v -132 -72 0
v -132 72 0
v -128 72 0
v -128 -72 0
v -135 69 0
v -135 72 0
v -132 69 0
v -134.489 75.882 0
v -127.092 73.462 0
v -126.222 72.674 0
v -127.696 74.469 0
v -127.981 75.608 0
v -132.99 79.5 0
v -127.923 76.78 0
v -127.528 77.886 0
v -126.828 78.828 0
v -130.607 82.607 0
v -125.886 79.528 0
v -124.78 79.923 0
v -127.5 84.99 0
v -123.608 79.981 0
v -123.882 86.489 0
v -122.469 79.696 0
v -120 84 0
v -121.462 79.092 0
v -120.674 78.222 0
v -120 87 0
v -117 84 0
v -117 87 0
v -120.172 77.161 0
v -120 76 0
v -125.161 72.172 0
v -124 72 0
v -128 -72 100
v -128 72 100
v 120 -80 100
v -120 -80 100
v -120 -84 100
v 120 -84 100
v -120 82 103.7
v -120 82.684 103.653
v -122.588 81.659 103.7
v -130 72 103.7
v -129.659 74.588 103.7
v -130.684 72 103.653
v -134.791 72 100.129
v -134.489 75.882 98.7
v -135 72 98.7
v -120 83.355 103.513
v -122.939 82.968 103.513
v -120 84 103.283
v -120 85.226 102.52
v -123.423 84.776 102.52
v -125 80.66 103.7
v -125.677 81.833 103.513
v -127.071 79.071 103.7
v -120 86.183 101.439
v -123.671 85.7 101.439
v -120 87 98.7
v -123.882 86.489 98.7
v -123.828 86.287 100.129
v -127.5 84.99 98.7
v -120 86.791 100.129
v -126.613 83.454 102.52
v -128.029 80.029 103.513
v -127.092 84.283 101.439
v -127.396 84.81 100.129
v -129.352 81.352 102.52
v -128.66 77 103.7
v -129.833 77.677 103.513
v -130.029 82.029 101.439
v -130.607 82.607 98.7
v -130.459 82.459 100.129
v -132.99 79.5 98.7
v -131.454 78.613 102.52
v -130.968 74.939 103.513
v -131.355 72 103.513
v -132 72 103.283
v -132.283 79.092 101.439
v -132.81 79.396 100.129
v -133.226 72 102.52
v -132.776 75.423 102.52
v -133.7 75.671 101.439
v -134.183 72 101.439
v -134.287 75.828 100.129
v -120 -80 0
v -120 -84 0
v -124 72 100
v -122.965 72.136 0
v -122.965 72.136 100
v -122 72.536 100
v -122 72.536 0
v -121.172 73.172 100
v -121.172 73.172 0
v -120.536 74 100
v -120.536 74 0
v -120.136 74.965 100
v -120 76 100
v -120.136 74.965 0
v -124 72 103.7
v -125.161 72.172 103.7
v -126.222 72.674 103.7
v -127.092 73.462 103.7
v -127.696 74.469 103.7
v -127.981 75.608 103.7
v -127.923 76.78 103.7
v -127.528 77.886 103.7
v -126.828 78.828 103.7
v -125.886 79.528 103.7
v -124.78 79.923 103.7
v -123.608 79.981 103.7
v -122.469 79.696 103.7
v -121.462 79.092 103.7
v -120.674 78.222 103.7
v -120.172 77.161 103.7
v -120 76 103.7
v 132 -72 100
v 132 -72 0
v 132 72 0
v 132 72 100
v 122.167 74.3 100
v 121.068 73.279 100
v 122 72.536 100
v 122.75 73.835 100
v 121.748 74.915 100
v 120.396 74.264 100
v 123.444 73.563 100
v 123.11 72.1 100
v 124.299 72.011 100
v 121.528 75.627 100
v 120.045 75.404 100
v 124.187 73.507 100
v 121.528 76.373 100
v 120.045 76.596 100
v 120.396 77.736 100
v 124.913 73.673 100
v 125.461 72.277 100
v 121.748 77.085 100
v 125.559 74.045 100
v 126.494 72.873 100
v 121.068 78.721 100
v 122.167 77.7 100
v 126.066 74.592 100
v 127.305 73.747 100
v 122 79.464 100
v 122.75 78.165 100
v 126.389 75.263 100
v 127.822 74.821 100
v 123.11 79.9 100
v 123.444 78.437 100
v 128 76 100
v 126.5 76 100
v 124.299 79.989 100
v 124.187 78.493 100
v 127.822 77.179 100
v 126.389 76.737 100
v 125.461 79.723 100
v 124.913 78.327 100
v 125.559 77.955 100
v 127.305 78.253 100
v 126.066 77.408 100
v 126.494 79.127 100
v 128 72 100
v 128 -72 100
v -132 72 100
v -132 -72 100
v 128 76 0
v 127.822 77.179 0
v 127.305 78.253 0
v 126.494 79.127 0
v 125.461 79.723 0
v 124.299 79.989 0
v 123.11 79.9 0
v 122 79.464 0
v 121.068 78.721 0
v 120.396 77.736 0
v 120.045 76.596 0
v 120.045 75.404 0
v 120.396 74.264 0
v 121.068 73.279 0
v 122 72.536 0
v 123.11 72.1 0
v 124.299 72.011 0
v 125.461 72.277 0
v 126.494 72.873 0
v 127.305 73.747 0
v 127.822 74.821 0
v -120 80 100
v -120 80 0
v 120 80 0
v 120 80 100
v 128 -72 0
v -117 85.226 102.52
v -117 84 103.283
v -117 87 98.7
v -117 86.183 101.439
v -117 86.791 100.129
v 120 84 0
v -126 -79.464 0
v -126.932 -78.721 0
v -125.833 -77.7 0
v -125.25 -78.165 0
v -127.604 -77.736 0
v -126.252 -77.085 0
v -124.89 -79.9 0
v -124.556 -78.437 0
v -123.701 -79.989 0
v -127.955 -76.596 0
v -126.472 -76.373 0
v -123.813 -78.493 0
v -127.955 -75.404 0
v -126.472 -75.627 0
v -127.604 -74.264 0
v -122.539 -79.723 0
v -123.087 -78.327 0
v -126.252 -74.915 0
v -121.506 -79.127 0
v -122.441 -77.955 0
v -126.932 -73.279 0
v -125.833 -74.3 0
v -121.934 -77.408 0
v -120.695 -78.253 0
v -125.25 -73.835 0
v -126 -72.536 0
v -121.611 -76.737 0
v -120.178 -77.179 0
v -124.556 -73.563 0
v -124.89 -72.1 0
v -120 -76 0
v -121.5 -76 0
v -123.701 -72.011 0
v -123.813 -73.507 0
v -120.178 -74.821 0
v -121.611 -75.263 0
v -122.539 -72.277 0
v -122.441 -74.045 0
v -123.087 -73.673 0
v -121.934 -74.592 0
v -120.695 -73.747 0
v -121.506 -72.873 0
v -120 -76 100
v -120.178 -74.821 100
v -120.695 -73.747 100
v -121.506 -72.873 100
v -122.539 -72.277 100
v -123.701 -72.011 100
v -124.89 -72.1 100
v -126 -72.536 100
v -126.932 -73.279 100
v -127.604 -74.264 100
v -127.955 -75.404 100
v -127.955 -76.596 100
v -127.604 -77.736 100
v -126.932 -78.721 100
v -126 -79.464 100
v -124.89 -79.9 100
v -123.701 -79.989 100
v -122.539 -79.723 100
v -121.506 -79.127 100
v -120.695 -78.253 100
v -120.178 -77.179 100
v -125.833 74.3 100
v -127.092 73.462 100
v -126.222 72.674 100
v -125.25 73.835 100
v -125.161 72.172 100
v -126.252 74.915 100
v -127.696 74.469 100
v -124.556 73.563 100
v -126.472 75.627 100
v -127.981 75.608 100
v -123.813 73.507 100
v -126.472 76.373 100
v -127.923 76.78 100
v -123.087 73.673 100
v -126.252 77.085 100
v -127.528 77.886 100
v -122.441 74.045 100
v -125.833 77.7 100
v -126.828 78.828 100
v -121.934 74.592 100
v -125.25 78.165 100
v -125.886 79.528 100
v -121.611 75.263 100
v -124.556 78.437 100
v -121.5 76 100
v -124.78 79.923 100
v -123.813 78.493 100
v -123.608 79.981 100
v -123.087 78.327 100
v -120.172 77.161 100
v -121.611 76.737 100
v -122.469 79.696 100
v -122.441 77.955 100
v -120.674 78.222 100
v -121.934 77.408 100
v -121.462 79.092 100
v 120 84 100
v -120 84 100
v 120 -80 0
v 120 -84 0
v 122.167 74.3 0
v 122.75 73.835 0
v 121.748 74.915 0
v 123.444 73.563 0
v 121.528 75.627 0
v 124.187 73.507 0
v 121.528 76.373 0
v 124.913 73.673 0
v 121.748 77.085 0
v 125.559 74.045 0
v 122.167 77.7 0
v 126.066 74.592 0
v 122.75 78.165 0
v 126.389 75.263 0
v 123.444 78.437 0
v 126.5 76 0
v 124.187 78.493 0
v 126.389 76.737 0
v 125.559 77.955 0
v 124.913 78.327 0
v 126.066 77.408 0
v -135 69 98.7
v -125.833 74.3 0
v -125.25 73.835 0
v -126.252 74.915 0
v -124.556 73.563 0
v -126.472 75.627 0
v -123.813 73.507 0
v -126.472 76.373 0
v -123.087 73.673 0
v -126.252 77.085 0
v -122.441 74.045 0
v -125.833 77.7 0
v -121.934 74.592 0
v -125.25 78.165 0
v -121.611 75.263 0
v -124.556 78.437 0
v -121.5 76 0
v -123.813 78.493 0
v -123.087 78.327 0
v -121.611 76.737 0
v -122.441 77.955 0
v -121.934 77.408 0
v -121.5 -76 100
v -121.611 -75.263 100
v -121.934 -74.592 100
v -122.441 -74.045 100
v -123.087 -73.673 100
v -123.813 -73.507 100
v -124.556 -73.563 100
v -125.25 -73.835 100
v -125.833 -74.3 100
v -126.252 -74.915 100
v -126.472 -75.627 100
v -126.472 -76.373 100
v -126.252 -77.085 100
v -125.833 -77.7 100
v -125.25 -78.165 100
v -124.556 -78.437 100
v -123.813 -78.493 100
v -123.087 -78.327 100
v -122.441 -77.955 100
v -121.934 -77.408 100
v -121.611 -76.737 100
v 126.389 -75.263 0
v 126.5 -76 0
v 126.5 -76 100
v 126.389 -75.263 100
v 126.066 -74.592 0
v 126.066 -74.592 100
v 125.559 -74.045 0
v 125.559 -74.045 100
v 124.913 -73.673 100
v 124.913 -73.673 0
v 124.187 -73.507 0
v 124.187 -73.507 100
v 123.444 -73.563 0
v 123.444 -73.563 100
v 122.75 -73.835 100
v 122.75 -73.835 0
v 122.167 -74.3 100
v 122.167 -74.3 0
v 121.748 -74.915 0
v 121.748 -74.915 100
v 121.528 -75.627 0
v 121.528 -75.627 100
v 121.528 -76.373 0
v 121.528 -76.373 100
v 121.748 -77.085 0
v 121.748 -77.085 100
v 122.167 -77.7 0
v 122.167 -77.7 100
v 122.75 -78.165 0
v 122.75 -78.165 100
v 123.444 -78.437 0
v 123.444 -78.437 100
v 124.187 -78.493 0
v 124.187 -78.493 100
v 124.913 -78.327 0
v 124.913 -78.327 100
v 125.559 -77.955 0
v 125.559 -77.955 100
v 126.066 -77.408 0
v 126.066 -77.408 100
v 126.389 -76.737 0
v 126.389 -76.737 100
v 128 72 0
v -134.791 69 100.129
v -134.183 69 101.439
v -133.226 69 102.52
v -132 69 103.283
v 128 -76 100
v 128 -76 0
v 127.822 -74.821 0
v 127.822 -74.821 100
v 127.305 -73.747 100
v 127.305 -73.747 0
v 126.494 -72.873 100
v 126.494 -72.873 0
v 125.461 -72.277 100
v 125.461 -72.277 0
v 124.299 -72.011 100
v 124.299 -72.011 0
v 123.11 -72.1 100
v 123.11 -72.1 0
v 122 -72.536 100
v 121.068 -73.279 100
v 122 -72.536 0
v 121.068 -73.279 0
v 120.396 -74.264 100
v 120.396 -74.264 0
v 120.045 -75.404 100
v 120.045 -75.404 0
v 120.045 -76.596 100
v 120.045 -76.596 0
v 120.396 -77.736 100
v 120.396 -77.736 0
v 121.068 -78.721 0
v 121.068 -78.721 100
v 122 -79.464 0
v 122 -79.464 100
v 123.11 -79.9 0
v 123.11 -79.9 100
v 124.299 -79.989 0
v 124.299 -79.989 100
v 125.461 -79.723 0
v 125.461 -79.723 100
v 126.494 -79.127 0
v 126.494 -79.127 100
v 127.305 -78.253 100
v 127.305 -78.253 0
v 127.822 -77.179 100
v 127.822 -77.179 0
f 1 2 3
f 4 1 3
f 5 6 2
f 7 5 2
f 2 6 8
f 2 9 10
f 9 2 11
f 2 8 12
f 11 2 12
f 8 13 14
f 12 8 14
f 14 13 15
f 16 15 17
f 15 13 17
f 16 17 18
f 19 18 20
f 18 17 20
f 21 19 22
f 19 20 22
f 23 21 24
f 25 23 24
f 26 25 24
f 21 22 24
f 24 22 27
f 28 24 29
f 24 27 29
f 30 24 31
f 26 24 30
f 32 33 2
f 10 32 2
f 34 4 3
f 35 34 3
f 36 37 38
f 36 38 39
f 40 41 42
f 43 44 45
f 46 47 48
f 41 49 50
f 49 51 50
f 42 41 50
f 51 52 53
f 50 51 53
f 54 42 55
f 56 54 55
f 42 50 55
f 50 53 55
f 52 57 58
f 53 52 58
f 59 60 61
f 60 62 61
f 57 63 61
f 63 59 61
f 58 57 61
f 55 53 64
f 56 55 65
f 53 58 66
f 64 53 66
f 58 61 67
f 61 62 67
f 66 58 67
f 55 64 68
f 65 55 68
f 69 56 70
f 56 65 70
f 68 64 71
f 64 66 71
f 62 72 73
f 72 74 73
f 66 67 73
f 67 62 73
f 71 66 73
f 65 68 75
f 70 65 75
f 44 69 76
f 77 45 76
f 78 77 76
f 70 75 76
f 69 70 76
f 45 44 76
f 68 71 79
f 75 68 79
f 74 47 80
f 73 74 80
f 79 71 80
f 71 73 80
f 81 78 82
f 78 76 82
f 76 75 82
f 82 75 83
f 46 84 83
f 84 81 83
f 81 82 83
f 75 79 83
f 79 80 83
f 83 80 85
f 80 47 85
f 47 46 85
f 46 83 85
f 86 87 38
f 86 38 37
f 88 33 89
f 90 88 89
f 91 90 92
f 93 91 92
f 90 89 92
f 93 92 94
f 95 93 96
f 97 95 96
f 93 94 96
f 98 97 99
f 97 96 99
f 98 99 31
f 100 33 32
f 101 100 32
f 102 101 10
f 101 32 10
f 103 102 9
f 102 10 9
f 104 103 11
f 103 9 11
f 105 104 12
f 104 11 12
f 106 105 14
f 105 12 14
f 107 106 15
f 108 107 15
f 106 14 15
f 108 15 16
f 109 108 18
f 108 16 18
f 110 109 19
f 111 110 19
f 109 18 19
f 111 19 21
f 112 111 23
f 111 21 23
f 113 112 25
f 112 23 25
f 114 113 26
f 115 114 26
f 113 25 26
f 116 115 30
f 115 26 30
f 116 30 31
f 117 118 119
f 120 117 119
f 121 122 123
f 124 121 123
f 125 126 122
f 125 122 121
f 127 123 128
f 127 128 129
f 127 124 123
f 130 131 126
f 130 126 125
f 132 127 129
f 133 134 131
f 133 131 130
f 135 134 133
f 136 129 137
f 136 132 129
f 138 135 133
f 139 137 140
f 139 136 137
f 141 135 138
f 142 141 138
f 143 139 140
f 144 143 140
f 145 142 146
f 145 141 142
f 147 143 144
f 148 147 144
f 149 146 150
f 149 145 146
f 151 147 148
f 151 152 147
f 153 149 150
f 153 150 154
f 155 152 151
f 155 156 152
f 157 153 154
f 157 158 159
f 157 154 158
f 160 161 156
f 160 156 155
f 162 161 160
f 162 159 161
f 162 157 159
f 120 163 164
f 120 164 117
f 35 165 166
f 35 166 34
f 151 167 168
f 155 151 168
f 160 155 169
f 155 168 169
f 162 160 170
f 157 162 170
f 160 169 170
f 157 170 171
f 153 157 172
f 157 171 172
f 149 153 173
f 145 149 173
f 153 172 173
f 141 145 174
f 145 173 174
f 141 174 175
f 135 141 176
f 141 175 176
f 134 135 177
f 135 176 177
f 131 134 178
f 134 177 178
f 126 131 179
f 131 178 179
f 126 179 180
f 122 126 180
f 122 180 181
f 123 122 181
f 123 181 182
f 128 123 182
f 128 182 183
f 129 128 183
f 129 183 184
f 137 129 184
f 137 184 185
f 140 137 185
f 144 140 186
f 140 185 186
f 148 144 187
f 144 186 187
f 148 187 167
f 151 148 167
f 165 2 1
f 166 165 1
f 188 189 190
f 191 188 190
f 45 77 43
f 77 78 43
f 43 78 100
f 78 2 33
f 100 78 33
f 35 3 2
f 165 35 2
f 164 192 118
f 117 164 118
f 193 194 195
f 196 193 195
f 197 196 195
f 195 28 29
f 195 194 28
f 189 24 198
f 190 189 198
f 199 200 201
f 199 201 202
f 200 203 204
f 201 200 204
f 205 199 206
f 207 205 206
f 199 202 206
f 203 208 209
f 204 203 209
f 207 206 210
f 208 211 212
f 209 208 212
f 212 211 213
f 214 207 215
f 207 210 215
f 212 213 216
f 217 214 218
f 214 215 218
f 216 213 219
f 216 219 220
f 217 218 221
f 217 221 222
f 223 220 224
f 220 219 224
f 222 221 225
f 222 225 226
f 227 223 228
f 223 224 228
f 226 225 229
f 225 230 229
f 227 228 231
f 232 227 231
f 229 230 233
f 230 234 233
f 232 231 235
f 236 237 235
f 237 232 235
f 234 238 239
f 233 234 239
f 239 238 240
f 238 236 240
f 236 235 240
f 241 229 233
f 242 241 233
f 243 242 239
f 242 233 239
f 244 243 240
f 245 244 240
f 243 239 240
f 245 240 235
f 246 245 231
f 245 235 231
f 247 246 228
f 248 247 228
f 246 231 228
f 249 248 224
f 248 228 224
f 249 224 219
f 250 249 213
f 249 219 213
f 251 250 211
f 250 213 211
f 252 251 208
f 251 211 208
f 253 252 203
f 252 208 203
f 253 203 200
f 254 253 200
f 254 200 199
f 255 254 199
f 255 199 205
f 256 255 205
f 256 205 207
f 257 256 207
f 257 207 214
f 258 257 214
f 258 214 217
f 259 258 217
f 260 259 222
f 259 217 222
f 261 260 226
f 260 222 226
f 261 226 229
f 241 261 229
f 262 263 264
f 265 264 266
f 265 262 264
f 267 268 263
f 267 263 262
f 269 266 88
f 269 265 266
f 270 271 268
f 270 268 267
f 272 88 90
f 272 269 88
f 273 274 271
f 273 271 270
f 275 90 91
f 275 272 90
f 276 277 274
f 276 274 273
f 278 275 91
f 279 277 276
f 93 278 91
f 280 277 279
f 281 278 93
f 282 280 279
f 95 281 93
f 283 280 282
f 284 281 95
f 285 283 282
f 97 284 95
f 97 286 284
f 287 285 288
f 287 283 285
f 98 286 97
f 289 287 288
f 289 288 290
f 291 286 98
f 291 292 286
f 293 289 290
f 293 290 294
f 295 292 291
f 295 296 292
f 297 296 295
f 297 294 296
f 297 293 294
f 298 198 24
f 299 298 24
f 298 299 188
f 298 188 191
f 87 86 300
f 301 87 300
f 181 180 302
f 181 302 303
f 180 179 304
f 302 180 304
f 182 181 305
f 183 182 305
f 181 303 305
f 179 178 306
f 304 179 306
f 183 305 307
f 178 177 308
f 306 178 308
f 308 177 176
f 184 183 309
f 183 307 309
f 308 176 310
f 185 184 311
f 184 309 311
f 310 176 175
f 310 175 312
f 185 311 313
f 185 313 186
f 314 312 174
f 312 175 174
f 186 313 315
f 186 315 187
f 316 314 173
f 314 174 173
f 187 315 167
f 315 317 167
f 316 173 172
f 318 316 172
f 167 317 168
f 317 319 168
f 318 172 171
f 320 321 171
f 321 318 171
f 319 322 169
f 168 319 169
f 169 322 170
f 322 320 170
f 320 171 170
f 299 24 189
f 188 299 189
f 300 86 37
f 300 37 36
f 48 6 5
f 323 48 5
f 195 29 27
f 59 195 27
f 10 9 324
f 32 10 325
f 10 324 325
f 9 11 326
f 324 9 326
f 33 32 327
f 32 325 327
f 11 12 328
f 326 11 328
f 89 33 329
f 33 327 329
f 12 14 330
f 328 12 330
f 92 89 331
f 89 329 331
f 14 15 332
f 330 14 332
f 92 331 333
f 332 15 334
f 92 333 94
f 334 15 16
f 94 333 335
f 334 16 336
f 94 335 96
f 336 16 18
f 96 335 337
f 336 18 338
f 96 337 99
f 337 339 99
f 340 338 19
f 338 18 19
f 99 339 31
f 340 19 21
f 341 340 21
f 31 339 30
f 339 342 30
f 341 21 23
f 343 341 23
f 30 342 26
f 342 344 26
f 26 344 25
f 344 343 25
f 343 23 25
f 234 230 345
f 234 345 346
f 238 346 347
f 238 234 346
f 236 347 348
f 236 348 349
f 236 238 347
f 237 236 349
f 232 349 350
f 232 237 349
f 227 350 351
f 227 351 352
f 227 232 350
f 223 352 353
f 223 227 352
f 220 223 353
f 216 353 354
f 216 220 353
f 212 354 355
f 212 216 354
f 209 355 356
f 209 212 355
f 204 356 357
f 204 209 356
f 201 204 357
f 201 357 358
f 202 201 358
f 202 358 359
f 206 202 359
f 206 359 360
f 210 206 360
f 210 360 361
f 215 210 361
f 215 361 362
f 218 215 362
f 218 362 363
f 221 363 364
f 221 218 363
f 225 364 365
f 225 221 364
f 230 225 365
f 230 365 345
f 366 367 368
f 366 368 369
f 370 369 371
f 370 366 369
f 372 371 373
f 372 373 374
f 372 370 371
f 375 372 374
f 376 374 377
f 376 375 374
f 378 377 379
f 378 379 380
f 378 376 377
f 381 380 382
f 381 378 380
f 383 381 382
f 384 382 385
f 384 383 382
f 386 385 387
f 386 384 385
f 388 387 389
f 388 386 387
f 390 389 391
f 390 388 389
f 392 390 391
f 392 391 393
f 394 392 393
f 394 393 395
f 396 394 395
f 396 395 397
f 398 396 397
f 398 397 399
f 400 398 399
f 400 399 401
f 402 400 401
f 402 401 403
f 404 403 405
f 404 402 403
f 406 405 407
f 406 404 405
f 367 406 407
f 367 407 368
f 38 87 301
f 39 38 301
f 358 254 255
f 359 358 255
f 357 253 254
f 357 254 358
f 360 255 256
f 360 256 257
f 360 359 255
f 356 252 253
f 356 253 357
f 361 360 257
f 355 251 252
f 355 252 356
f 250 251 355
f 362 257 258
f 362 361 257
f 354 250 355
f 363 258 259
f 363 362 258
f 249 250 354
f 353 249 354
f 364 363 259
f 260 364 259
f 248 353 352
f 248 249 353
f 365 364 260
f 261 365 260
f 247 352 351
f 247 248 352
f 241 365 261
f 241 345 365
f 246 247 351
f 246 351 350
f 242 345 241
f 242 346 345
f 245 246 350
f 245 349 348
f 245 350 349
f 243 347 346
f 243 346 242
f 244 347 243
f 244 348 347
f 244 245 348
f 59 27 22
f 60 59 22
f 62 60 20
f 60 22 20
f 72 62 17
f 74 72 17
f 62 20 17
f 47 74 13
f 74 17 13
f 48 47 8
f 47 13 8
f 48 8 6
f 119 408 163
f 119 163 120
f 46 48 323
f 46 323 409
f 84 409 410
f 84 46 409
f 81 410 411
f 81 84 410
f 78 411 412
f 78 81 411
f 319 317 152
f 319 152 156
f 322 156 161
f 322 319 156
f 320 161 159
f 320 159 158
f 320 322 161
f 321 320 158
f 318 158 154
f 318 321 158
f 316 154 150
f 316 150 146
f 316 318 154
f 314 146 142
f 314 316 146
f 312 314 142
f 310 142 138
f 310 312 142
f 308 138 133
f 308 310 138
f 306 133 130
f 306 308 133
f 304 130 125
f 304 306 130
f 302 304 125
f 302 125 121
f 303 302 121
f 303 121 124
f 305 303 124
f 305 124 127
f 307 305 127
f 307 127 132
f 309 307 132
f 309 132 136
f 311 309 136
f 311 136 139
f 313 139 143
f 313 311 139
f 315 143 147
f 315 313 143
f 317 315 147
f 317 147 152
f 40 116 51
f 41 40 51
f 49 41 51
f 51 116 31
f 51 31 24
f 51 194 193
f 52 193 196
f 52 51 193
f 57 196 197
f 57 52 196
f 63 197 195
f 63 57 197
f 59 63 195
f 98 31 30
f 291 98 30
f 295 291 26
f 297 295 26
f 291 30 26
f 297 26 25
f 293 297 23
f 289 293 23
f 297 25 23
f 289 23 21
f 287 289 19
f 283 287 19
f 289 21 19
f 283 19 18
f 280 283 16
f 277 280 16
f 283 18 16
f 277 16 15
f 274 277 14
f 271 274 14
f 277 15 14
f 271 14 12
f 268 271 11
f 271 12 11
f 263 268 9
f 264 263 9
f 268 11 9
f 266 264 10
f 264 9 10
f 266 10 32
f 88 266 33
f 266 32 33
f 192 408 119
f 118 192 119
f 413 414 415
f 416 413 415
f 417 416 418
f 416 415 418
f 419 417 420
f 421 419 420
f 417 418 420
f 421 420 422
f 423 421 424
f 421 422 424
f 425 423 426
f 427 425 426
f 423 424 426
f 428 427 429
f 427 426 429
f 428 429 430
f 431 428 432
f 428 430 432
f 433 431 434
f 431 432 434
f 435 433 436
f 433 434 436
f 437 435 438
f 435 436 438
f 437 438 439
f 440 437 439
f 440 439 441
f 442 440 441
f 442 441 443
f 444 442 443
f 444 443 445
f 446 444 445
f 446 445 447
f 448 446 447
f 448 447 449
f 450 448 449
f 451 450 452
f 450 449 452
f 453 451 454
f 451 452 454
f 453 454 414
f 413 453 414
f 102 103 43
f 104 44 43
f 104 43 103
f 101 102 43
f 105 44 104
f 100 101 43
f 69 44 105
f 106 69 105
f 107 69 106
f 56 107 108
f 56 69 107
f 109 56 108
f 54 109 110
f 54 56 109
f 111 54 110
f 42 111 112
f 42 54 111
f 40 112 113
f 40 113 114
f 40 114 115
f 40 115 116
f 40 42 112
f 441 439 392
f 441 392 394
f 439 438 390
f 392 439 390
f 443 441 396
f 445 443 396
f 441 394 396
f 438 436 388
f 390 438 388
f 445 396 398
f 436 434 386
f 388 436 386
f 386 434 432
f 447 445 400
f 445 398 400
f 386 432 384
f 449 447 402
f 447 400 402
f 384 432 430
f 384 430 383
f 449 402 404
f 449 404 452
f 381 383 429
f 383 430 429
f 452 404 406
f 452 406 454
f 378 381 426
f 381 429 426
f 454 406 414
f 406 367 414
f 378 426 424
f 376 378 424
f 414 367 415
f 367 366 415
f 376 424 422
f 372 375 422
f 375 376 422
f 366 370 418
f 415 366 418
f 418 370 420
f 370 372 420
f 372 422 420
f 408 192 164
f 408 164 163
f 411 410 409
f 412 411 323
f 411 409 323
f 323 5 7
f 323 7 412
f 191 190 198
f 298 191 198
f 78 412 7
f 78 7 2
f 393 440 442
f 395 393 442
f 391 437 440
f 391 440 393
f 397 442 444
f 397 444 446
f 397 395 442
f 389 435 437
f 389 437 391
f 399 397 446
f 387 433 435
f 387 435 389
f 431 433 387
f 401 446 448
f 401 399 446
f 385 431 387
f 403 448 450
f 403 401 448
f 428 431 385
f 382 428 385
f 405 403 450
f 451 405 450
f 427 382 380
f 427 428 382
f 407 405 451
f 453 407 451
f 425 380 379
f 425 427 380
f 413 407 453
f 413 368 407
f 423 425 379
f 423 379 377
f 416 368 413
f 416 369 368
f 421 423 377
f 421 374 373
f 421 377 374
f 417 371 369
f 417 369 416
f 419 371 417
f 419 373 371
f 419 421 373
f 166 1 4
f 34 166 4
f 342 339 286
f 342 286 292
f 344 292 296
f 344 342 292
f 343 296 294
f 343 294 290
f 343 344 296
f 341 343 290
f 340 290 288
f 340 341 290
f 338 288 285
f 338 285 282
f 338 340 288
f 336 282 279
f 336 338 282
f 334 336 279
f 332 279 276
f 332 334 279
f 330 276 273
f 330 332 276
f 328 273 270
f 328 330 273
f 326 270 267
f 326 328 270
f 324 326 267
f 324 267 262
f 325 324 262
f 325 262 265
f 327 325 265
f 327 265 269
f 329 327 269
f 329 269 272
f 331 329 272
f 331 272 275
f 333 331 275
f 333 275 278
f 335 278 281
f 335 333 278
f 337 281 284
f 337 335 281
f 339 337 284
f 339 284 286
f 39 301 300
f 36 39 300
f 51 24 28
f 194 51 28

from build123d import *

# Parameters (mm, degrees)
F0_R        = 2.5
F1_DEPTH    = 100
F0_R_2      = 4
F0_W        = 240
F0_H        = 4
F0_W_2      = 4
F0_H_2      = 144
F2_DEPTH    = 103.7
F3_T1_DEPTH = 15.5
F3_T3_DEPTH = 15.5
F3_T6_ANGLE = 90


# Not quite as in the source:
# - a fillet or chamfer that OpenCascade refuses, or shapes differently, is made with other operations: its cross-section is extruded or revolved along the edge and cut away or added


with BuildPart() as f1:
    # F0 (on Top) → F1 (new body)
    with BuildSketch(Plane.XY):
        with BuildLine():
            ThreePointArc((-124, 72), (-121.1715728753, 73.1715728753), (-120, 76))
            ThreePointArc((-120, 76), (-126.8284271247, 78.8284271247), (-124, 72))
        make_face()
        with Locations((-124, 76)):
            Circle(F0_R, mode=Mode.SUBTRACT)
    extrude(amount=F1_DEPTH)


with BuildPart() as f1b:
    # F0 (on Top) → F1, piece 2 (new body)
    with BuildSketch(Plane.XY):
        with Locations((-124, -76)):
            Circle(F0_R_2)
        with Locations((-124, -76)):
            Circle(F0_R, mode=Mode.SUBTRACT)
    extrude(amount=F1_DEPTH)


with BuildPart() as f1c:
    # F0 (on Top) → F1, piece 3 (new body)
    with BuildSketch(Plane.XY):
        with Locations((124, -76)):
            Circle(F0_R_2)
        with Locations((124, -76)):
            Circle(F0_R, mode=Mode.SUBTRACT)
    extrude(amount=F1_DEPTH)


with BuildPart() as f1d:
    # F0 (on Top) → F1, piece 4 (new body)
    with BuildSketch(Plane.XY):
        with Locations((124, 76)):
            Circle(F0_R_2)
        with Locations((124, 76)):
            Circle(F0_R, mode=Mode.SUBTRACT)
    extrude(amount=F1_DEPTH)


with BuildPart() as f1e:
    # F0 (on Top) → F1, piece 5 (new body)
    with BuildSketch(Plane.XY):
        Polygon((-120, 84), (-120, 80), (120, 80), (120, 84), (-117, 84), align=None)
    extrude(amount=F1_DEPTH)


with BuildPart() as f1f:
    # F0 (on Top) → F1, piece 6 (new body)
    with BuildSketch(Plane.XY):
        Polygon((-128, -72), (-128, 72), (-132, 72), (-132, 69), (-132, -72), align=None)
    extrude(amount=F1_DEPTH)


with BuildPart() as f1g:
    # F0 (on Top) → F1, piece 7 (new body)
    with BuildSketch(Plane.XY):
        with Locations((0, -82)):
            Rectangle(F0_W, F0_H)
    extrude(amount=F1_DEPTH)


with BuildPart() as f1h:
    # F0 (on Top) → F1, piece 8 (new body)
    with BuildSketch(Plane.XY):
        with Locations((130, 0)):
            Rectangle(F0_W_2, F0_H_2)
    extrude(amount=F1_DEPTH)


with BuildPart() as f2:
    # F0 (on Top) → F2 (new body)
    with BuildSketch(Plane.XY):
        with BuildLine():
            ThreePointArc((-124, 72), (-126.8284271247, 78.8284271247), (-120, 76))
            Line((-120, 76), (-120, 80))
            Line((-120, 80), (-120, 84))
            Line((-120, 84), (-117, 84))
            Line((-117, 84), (-117, 87))
            Line((-117, 87), (-120, 87))
            ThreePointArc((-120, 87), (-130.6066017178, 82.6066017178), (-135, 72))
            Line((-135, 72), (-135, 69))
            Line((-135, 69), (-132, 69))
            Line((-132, 69), (-132, 72))
            Line((-132, 72), (-128, 72))
            Line((-128, 72), (-124, 72))
        make_face()
    extrude(amount=F2_DEPTH)

    # F3: fillet of radius 5 on 1 edges, made by hand

    # F3_s2 → F3_t1 (cut)
    with BuildSketch(Plane.YZ.offset(-120)):
        with BuildLine():
            ThreePointArc((82, 103.7), (85.5355339059, 102.2355339059), (87, 98.7))
            Line((87, 98.7), (87, 103.7))
            Line((87, 103.7), (82, 103.7))
        make_face()
    extrude(amount=F3_T1_DEPTH, mode=Mode.SUBTRACT)

    # F3_s4 → F3_t3 (cut)
    with BuildSketch(Plane.XZ.offset(-72)):
        with BuildLine():
            ThreePointArc((-135, 98.7), (-133.5355339059, 102.2355339059), (-130, 103.7))
            Line((-130, 103.7), (-135, 103.7))
            Line((-135, 103.7), (-135, 98.7))
        make_face()
    extrude(amount=F3_T3_DEPTH, mode=Mode.SUBTRACT)

    # F3_s5 → F3_t6 (revolve, cut)
    with BuildSketch(Plane.YZ.offset(-120)):
        with BuildLine():
            ThreePointArc((82, 103.7), (85.5355339059, 102.2355339059), (87, 98.7))
            Line((87, 98.7), (87, 103.7))
            Line((87, 103.7), (82, 103.7))
        make_face()
    revolve(axis=Axis((-120, 72, 103.7), (0, 0, 1)), revolution_arc=F3_T6_ANGLE, mode=Mode.SUBTRACT)


solid = Compound([f1.part, f1b.part, f1c.part, f1d.part, f1e.part, f1f.part, f1g.part, f1h.part, f2.part])
